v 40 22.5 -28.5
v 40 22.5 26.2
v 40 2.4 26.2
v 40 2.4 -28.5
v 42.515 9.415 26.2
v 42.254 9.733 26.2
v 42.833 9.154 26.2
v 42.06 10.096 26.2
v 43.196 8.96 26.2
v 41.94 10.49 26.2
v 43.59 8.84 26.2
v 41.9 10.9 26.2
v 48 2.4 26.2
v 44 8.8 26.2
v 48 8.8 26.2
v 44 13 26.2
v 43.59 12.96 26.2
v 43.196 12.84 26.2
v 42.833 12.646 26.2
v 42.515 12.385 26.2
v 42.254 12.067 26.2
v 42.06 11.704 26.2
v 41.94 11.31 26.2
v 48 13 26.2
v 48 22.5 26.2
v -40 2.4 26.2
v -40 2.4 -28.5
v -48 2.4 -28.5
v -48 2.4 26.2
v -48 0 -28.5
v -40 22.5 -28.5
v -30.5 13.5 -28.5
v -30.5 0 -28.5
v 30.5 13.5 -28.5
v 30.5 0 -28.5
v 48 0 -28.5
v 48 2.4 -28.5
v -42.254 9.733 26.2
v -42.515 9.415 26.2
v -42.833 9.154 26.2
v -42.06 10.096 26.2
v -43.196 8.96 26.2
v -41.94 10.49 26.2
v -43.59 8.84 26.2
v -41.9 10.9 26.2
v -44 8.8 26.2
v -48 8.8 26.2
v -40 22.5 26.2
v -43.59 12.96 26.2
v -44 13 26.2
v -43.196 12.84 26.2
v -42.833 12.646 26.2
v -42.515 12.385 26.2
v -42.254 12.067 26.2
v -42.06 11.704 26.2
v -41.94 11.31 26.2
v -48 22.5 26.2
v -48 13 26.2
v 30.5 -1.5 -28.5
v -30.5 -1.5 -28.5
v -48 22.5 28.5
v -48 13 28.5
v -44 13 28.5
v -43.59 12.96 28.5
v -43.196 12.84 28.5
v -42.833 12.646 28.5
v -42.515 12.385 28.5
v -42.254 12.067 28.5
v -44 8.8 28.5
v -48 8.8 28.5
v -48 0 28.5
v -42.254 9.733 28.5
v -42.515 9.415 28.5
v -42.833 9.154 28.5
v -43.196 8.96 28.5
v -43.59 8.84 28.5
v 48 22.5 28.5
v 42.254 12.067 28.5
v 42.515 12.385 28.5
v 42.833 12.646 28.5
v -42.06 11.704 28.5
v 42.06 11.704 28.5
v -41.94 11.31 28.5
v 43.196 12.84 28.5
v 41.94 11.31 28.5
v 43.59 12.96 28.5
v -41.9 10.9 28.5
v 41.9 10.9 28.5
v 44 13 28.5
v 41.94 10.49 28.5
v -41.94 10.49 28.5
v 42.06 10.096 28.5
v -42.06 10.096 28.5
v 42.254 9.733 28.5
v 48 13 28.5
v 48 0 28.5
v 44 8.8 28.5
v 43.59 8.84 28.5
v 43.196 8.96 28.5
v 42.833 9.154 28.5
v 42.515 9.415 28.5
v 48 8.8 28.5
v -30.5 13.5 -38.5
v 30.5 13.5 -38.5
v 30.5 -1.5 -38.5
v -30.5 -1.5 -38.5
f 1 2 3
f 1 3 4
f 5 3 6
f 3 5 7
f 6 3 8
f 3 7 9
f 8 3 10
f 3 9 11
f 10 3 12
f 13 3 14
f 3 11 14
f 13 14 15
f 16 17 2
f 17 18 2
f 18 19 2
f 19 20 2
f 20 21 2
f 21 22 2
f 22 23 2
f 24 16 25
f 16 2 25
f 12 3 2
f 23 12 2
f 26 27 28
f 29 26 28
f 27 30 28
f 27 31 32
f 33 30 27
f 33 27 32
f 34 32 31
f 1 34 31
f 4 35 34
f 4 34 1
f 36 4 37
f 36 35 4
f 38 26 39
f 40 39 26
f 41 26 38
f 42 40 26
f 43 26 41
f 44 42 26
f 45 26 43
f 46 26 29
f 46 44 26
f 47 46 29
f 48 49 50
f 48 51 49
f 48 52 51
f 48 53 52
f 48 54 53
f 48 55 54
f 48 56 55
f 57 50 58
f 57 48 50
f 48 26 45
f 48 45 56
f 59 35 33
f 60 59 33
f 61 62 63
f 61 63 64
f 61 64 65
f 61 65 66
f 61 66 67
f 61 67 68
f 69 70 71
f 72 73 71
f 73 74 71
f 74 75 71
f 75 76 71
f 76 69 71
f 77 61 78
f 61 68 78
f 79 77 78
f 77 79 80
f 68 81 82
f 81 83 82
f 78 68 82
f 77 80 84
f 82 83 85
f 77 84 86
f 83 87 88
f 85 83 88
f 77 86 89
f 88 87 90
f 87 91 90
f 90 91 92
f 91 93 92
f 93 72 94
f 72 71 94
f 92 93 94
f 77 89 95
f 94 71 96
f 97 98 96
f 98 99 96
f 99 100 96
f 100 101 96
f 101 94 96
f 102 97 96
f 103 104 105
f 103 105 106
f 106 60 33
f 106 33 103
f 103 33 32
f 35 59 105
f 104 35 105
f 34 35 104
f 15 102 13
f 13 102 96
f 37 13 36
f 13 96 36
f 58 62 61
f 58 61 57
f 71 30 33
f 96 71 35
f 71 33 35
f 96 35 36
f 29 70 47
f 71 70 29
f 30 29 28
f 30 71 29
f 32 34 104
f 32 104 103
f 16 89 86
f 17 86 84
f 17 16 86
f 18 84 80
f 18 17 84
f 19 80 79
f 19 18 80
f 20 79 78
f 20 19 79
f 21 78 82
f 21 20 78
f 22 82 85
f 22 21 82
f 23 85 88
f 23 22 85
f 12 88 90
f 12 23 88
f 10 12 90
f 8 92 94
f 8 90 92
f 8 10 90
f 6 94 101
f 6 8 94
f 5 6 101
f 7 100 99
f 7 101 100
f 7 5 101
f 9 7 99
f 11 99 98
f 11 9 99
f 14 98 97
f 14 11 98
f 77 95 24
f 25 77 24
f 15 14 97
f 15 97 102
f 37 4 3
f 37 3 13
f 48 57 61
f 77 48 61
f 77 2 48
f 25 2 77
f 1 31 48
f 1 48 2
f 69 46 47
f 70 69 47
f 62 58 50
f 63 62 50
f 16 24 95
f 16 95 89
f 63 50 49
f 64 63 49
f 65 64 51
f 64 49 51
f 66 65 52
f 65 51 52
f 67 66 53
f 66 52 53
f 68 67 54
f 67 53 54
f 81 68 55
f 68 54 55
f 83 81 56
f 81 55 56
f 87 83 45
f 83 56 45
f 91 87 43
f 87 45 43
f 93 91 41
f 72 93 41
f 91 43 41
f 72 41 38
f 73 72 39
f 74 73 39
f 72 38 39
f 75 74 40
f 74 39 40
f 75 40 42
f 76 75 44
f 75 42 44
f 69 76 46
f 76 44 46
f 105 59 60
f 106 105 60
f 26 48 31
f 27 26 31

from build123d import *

# Parameters (mm, degrees)
SKETCH_1_W          = 96
SKETCH_1_H          = 57
EXTRUDE_1_DEPTH     = 22.5
SKETCH_2_W          = 61
SKETCH_2_H          = 15
EXTRUDE_2_DEPTH     = 10
SKETCH_3_W          = 8
SKETCH_3_H          = 54.7
CUT_EXTRUDE_1_DEPTH = 20.1
CUT_EXTRUDE_2_DEPTH = 84.64412711


with BuildPart() as part:
    # 草图1 → 凸台-拉伸1 (new body)
    with BuildSketch(Plane(origin=(0, 0, 0), x_dir=(1, 0, 0), z_dir=(0, 1, 0))):
        Rectangle(SKETCH_1_W, SKETCH_1_H)
    extrude(amount=EXTRUDE_1_DEPTH)

    # 草图2 → 凸台-拉伸2 (add)
    with BuildSketch(Plane(origin=(0, 0, -28.5), x_dir=(-1, 0, 0), z_dir=(0, 0, -1))):
        with Locations((0, 6)):
            Rectangle(SKETCH_2_W, SKETCH_2_H)
    extrude(amount=EXTRUDE_2_DEPTH)

    # 草图3 → 切除-拉伸1 (cut)
    with BuildSketch(Plane(origin=(0, 22.5, 0), x_dir=(1, 0, 0), z_dir=(0, 1, 0))):
        with Locations((44, 1.15)):
            Rectangle(SKETCH_3_W, SKETCH_3_H)
    cut_extrude_1 = extrude(amount=-CUT_EXTRUDE_1_DEPTH, mode=Mode.SUBTRACT)

    # 草图4 → 切除-拉伸2 (cut, through all)
    with BuildSketch(Plane(origin=(0, 0, 26.2), x_dir=(-1, 0, 0), z_dir=(0, 0, -1))):
        with BuildLine():
            Line((-44, 8.8), (-48, 8.8))
            Line((-48, 8.8), (-48, 13))
            Line((-48, 13), (-44, 13))
            ThreePointArc((-44, 13), (-41.9, 10.9), (-44, 8.8))
        make_face()
    cut_extrude_2 = extrude(amount=-CUT_EXTRUDE_2_DEPTH, mode=Mode.SUBTRACT)

    # 镜向2: 切除-拉伸1, 切除-拉伸2 across plane
    add(cut_extrude_1.mirror(Plane(origin=(0, 0, 0), x_dir=(0, 0, 1), z_dir=(1, 0, 0))), mode=Mode.SUBTRACT)
    add(cut_extrude_2.mirror(Plane(origin=(0, 0, 0), x_dir=(0, 0, 1), z_dir=(1, 0, 0))), mode=Mode.SUBTRACT)


solid = part.part
